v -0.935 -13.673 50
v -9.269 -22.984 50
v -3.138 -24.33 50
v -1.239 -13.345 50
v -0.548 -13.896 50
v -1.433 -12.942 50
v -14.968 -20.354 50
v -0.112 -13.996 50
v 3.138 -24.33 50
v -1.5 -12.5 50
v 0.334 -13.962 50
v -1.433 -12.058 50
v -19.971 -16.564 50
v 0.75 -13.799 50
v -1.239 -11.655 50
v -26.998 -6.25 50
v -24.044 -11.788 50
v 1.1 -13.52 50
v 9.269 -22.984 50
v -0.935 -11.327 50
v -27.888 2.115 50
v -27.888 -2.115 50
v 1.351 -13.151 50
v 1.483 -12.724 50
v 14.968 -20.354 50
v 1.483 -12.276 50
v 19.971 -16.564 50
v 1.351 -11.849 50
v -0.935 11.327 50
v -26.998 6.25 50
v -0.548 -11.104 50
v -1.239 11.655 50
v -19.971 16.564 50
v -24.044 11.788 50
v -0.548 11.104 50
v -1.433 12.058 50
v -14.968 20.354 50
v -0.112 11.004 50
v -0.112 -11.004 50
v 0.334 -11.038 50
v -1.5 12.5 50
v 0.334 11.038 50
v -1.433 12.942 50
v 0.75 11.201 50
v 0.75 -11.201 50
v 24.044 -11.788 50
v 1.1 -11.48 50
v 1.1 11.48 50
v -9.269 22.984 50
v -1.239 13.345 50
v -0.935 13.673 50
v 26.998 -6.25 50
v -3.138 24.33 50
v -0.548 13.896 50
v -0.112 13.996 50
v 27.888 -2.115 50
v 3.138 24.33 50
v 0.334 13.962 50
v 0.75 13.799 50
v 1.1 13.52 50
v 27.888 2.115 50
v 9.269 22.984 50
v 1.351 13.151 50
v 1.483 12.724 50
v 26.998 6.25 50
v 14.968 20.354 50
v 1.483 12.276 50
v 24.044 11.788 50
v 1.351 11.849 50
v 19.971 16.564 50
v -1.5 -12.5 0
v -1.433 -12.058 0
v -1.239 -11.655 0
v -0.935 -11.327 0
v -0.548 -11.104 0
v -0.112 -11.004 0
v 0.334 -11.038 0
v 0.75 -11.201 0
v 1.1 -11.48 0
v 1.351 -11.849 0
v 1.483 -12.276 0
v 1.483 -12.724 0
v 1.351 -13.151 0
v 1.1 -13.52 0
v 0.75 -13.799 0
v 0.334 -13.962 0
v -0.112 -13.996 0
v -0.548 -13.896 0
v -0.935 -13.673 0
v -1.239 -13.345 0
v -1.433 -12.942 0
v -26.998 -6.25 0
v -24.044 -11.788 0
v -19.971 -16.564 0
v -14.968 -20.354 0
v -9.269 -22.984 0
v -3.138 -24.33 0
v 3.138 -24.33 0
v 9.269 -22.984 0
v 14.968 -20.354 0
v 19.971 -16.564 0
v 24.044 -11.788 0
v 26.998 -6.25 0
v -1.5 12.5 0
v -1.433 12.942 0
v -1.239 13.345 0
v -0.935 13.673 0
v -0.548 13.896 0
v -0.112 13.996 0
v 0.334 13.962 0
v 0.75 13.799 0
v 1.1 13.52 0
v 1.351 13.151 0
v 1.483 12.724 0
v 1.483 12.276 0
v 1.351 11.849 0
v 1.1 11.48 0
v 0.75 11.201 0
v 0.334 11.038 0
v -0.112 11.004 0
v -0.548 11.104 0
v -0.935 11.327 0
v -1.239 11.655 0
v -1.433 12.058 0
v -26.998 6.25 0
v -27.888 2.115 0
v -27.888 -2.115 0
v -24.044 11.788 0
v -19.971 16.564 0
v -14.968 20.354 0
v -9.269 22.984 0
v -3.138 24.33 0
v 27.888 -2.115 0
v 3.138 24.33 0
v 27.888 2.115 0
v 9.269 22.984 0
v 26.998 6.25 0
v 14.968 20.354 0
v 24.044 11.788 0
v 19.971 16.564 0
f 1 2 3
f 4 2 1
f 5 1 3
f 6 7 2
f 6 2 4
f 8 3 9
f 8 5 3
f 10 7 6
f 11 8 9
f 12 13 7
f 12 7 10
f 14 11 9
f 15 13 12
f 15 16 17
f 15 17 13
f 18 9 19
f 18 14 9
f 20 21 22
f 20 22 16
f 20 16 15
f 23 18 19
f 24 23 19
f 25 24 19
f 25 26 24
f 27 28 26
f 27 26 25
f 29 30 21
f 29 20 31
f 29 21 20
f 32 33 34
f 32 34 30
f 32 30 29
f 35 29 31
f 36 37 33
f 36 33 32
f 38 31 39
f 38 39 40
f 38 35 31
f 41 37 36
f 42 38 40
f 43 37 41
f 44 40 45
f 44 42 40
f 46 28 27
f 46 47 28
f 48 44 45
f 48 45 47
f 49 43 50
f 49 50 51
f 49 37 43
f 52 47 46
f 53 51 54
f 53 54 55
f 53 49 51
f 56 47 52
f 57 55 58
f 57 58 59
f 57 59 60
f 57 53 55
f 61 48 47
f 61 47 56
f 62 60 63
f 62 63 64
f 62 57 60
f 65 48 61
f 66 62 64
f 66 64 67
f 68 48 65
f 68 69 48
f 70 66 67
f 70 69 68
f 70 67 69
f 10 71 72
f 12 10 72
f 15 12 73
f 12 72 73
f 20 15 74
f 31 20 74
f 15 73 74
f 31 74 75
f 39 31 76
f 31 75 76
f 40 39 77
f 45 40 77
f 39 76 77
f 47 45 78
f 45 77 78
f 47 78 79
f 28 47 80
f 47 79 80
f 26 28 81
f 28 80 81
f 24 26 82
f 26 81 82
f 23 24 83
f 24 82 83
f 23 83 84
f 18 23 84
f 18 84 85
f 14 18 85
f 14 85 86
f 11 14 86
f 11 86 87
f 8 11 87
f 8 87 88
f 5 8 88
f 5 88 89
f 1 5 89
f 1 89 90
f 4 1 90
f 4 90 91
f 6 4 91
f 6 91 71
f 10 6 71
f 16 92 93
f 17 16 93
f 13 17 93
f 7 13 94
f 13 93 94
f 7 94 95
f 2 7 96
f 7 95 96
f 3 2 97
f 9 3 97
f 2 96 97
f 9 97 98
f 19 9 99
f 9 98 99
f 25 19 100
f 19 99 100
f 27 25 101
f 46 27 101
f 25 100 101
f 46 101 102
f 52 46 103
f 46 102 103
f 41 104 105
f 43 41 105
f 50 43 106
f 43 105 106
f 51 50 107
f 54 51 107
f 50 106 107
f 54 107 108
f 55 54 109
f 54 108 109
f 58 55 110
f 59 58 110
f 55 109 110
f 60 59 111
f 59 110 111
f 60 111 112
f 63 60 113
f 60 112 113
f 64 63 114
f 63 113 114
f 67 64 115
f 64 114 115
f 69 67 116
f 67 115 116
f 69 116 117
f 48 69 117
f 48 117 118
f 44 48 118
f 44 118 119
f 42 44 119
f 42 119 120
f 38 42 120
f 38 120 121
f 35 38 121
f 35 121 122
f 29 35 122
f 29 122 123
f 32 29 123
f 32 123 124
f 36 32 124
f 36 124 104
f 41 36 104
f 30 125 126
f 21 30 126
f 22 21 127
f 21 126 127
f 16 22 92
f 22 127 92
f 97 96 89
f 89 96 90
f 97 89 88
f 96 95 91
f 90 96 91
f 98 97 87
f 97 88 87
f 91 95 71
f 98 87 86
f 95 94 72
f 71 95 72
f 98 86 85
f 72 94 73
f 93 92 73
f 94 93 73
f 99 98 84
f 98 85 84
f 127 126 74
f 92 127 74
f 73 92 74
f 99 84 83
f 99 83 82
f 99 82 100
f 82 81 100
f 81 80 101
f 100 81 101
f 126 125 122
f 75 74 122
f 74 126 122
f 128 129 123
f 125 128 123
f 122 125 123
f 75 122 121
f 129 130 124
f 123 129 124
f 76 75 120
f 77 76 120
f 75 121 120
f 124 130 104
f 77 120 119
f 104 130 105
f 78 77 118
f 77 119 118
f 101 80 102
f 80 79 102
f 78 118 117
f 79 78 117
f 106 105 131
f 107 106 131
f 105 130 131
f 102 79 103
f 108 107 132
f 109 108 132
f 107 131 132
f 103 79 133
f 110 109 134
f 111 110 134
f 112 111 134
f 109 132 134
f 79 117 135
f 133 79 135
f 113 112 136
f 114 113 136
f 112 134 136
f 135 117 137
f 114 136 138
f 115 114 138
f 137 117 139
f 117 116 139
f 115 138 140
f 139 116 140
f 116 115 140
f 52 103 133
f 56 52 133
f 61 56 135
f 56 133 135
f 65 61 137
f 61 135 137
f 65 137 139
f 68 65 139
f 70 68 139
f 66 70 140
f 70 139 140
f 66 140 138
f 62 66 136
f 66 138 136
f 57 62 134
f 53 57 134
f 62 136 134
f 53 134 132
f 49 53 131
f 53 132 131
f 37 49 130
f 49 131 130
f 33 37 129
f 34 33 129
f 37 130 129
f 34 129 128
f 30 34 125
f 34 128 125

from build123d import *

# Parameters (mm, degrees)
BOSS_EXTRU_1_DEPTH            = 50
DIAM_TRE_DU_PER_AGE_3_0_3_1_D = 3


with BuildPart() as part:
    # Esquisse1 → Boss.-Extru.1 (new body)
    with BuildSketch(Plane.XY):
        with BuildLine():
            ThreePointArc((-26.998355192, 6.25), (-28, 0), (-26.998355192, -6.25))
            ThreePointArc((-26.998355192, -6.25), (0, -24.5), (26.998355192, -6.25))
            ThreePointArc((26.998355192, -6.25), (28, 0), (26.998355192, 6.25))
            ThreePointArc((26.998355192, 6.25), (0, 24.5), (-26.998355192, 6.25))
        make_face()
    extrude(amount=BOSS_EXTRU_1_DEPTH)

    # Diamètre du perçage Ø3.0 (3)1 (through all)
    with Locations(Plane.XY.offset(50)):
        with Locations((0, 12.5), (0, -12.5)):
            Hole(DIAM_TRE_DU_PER_AGE_3_0_3_1_D / 2)


solid = part.part
